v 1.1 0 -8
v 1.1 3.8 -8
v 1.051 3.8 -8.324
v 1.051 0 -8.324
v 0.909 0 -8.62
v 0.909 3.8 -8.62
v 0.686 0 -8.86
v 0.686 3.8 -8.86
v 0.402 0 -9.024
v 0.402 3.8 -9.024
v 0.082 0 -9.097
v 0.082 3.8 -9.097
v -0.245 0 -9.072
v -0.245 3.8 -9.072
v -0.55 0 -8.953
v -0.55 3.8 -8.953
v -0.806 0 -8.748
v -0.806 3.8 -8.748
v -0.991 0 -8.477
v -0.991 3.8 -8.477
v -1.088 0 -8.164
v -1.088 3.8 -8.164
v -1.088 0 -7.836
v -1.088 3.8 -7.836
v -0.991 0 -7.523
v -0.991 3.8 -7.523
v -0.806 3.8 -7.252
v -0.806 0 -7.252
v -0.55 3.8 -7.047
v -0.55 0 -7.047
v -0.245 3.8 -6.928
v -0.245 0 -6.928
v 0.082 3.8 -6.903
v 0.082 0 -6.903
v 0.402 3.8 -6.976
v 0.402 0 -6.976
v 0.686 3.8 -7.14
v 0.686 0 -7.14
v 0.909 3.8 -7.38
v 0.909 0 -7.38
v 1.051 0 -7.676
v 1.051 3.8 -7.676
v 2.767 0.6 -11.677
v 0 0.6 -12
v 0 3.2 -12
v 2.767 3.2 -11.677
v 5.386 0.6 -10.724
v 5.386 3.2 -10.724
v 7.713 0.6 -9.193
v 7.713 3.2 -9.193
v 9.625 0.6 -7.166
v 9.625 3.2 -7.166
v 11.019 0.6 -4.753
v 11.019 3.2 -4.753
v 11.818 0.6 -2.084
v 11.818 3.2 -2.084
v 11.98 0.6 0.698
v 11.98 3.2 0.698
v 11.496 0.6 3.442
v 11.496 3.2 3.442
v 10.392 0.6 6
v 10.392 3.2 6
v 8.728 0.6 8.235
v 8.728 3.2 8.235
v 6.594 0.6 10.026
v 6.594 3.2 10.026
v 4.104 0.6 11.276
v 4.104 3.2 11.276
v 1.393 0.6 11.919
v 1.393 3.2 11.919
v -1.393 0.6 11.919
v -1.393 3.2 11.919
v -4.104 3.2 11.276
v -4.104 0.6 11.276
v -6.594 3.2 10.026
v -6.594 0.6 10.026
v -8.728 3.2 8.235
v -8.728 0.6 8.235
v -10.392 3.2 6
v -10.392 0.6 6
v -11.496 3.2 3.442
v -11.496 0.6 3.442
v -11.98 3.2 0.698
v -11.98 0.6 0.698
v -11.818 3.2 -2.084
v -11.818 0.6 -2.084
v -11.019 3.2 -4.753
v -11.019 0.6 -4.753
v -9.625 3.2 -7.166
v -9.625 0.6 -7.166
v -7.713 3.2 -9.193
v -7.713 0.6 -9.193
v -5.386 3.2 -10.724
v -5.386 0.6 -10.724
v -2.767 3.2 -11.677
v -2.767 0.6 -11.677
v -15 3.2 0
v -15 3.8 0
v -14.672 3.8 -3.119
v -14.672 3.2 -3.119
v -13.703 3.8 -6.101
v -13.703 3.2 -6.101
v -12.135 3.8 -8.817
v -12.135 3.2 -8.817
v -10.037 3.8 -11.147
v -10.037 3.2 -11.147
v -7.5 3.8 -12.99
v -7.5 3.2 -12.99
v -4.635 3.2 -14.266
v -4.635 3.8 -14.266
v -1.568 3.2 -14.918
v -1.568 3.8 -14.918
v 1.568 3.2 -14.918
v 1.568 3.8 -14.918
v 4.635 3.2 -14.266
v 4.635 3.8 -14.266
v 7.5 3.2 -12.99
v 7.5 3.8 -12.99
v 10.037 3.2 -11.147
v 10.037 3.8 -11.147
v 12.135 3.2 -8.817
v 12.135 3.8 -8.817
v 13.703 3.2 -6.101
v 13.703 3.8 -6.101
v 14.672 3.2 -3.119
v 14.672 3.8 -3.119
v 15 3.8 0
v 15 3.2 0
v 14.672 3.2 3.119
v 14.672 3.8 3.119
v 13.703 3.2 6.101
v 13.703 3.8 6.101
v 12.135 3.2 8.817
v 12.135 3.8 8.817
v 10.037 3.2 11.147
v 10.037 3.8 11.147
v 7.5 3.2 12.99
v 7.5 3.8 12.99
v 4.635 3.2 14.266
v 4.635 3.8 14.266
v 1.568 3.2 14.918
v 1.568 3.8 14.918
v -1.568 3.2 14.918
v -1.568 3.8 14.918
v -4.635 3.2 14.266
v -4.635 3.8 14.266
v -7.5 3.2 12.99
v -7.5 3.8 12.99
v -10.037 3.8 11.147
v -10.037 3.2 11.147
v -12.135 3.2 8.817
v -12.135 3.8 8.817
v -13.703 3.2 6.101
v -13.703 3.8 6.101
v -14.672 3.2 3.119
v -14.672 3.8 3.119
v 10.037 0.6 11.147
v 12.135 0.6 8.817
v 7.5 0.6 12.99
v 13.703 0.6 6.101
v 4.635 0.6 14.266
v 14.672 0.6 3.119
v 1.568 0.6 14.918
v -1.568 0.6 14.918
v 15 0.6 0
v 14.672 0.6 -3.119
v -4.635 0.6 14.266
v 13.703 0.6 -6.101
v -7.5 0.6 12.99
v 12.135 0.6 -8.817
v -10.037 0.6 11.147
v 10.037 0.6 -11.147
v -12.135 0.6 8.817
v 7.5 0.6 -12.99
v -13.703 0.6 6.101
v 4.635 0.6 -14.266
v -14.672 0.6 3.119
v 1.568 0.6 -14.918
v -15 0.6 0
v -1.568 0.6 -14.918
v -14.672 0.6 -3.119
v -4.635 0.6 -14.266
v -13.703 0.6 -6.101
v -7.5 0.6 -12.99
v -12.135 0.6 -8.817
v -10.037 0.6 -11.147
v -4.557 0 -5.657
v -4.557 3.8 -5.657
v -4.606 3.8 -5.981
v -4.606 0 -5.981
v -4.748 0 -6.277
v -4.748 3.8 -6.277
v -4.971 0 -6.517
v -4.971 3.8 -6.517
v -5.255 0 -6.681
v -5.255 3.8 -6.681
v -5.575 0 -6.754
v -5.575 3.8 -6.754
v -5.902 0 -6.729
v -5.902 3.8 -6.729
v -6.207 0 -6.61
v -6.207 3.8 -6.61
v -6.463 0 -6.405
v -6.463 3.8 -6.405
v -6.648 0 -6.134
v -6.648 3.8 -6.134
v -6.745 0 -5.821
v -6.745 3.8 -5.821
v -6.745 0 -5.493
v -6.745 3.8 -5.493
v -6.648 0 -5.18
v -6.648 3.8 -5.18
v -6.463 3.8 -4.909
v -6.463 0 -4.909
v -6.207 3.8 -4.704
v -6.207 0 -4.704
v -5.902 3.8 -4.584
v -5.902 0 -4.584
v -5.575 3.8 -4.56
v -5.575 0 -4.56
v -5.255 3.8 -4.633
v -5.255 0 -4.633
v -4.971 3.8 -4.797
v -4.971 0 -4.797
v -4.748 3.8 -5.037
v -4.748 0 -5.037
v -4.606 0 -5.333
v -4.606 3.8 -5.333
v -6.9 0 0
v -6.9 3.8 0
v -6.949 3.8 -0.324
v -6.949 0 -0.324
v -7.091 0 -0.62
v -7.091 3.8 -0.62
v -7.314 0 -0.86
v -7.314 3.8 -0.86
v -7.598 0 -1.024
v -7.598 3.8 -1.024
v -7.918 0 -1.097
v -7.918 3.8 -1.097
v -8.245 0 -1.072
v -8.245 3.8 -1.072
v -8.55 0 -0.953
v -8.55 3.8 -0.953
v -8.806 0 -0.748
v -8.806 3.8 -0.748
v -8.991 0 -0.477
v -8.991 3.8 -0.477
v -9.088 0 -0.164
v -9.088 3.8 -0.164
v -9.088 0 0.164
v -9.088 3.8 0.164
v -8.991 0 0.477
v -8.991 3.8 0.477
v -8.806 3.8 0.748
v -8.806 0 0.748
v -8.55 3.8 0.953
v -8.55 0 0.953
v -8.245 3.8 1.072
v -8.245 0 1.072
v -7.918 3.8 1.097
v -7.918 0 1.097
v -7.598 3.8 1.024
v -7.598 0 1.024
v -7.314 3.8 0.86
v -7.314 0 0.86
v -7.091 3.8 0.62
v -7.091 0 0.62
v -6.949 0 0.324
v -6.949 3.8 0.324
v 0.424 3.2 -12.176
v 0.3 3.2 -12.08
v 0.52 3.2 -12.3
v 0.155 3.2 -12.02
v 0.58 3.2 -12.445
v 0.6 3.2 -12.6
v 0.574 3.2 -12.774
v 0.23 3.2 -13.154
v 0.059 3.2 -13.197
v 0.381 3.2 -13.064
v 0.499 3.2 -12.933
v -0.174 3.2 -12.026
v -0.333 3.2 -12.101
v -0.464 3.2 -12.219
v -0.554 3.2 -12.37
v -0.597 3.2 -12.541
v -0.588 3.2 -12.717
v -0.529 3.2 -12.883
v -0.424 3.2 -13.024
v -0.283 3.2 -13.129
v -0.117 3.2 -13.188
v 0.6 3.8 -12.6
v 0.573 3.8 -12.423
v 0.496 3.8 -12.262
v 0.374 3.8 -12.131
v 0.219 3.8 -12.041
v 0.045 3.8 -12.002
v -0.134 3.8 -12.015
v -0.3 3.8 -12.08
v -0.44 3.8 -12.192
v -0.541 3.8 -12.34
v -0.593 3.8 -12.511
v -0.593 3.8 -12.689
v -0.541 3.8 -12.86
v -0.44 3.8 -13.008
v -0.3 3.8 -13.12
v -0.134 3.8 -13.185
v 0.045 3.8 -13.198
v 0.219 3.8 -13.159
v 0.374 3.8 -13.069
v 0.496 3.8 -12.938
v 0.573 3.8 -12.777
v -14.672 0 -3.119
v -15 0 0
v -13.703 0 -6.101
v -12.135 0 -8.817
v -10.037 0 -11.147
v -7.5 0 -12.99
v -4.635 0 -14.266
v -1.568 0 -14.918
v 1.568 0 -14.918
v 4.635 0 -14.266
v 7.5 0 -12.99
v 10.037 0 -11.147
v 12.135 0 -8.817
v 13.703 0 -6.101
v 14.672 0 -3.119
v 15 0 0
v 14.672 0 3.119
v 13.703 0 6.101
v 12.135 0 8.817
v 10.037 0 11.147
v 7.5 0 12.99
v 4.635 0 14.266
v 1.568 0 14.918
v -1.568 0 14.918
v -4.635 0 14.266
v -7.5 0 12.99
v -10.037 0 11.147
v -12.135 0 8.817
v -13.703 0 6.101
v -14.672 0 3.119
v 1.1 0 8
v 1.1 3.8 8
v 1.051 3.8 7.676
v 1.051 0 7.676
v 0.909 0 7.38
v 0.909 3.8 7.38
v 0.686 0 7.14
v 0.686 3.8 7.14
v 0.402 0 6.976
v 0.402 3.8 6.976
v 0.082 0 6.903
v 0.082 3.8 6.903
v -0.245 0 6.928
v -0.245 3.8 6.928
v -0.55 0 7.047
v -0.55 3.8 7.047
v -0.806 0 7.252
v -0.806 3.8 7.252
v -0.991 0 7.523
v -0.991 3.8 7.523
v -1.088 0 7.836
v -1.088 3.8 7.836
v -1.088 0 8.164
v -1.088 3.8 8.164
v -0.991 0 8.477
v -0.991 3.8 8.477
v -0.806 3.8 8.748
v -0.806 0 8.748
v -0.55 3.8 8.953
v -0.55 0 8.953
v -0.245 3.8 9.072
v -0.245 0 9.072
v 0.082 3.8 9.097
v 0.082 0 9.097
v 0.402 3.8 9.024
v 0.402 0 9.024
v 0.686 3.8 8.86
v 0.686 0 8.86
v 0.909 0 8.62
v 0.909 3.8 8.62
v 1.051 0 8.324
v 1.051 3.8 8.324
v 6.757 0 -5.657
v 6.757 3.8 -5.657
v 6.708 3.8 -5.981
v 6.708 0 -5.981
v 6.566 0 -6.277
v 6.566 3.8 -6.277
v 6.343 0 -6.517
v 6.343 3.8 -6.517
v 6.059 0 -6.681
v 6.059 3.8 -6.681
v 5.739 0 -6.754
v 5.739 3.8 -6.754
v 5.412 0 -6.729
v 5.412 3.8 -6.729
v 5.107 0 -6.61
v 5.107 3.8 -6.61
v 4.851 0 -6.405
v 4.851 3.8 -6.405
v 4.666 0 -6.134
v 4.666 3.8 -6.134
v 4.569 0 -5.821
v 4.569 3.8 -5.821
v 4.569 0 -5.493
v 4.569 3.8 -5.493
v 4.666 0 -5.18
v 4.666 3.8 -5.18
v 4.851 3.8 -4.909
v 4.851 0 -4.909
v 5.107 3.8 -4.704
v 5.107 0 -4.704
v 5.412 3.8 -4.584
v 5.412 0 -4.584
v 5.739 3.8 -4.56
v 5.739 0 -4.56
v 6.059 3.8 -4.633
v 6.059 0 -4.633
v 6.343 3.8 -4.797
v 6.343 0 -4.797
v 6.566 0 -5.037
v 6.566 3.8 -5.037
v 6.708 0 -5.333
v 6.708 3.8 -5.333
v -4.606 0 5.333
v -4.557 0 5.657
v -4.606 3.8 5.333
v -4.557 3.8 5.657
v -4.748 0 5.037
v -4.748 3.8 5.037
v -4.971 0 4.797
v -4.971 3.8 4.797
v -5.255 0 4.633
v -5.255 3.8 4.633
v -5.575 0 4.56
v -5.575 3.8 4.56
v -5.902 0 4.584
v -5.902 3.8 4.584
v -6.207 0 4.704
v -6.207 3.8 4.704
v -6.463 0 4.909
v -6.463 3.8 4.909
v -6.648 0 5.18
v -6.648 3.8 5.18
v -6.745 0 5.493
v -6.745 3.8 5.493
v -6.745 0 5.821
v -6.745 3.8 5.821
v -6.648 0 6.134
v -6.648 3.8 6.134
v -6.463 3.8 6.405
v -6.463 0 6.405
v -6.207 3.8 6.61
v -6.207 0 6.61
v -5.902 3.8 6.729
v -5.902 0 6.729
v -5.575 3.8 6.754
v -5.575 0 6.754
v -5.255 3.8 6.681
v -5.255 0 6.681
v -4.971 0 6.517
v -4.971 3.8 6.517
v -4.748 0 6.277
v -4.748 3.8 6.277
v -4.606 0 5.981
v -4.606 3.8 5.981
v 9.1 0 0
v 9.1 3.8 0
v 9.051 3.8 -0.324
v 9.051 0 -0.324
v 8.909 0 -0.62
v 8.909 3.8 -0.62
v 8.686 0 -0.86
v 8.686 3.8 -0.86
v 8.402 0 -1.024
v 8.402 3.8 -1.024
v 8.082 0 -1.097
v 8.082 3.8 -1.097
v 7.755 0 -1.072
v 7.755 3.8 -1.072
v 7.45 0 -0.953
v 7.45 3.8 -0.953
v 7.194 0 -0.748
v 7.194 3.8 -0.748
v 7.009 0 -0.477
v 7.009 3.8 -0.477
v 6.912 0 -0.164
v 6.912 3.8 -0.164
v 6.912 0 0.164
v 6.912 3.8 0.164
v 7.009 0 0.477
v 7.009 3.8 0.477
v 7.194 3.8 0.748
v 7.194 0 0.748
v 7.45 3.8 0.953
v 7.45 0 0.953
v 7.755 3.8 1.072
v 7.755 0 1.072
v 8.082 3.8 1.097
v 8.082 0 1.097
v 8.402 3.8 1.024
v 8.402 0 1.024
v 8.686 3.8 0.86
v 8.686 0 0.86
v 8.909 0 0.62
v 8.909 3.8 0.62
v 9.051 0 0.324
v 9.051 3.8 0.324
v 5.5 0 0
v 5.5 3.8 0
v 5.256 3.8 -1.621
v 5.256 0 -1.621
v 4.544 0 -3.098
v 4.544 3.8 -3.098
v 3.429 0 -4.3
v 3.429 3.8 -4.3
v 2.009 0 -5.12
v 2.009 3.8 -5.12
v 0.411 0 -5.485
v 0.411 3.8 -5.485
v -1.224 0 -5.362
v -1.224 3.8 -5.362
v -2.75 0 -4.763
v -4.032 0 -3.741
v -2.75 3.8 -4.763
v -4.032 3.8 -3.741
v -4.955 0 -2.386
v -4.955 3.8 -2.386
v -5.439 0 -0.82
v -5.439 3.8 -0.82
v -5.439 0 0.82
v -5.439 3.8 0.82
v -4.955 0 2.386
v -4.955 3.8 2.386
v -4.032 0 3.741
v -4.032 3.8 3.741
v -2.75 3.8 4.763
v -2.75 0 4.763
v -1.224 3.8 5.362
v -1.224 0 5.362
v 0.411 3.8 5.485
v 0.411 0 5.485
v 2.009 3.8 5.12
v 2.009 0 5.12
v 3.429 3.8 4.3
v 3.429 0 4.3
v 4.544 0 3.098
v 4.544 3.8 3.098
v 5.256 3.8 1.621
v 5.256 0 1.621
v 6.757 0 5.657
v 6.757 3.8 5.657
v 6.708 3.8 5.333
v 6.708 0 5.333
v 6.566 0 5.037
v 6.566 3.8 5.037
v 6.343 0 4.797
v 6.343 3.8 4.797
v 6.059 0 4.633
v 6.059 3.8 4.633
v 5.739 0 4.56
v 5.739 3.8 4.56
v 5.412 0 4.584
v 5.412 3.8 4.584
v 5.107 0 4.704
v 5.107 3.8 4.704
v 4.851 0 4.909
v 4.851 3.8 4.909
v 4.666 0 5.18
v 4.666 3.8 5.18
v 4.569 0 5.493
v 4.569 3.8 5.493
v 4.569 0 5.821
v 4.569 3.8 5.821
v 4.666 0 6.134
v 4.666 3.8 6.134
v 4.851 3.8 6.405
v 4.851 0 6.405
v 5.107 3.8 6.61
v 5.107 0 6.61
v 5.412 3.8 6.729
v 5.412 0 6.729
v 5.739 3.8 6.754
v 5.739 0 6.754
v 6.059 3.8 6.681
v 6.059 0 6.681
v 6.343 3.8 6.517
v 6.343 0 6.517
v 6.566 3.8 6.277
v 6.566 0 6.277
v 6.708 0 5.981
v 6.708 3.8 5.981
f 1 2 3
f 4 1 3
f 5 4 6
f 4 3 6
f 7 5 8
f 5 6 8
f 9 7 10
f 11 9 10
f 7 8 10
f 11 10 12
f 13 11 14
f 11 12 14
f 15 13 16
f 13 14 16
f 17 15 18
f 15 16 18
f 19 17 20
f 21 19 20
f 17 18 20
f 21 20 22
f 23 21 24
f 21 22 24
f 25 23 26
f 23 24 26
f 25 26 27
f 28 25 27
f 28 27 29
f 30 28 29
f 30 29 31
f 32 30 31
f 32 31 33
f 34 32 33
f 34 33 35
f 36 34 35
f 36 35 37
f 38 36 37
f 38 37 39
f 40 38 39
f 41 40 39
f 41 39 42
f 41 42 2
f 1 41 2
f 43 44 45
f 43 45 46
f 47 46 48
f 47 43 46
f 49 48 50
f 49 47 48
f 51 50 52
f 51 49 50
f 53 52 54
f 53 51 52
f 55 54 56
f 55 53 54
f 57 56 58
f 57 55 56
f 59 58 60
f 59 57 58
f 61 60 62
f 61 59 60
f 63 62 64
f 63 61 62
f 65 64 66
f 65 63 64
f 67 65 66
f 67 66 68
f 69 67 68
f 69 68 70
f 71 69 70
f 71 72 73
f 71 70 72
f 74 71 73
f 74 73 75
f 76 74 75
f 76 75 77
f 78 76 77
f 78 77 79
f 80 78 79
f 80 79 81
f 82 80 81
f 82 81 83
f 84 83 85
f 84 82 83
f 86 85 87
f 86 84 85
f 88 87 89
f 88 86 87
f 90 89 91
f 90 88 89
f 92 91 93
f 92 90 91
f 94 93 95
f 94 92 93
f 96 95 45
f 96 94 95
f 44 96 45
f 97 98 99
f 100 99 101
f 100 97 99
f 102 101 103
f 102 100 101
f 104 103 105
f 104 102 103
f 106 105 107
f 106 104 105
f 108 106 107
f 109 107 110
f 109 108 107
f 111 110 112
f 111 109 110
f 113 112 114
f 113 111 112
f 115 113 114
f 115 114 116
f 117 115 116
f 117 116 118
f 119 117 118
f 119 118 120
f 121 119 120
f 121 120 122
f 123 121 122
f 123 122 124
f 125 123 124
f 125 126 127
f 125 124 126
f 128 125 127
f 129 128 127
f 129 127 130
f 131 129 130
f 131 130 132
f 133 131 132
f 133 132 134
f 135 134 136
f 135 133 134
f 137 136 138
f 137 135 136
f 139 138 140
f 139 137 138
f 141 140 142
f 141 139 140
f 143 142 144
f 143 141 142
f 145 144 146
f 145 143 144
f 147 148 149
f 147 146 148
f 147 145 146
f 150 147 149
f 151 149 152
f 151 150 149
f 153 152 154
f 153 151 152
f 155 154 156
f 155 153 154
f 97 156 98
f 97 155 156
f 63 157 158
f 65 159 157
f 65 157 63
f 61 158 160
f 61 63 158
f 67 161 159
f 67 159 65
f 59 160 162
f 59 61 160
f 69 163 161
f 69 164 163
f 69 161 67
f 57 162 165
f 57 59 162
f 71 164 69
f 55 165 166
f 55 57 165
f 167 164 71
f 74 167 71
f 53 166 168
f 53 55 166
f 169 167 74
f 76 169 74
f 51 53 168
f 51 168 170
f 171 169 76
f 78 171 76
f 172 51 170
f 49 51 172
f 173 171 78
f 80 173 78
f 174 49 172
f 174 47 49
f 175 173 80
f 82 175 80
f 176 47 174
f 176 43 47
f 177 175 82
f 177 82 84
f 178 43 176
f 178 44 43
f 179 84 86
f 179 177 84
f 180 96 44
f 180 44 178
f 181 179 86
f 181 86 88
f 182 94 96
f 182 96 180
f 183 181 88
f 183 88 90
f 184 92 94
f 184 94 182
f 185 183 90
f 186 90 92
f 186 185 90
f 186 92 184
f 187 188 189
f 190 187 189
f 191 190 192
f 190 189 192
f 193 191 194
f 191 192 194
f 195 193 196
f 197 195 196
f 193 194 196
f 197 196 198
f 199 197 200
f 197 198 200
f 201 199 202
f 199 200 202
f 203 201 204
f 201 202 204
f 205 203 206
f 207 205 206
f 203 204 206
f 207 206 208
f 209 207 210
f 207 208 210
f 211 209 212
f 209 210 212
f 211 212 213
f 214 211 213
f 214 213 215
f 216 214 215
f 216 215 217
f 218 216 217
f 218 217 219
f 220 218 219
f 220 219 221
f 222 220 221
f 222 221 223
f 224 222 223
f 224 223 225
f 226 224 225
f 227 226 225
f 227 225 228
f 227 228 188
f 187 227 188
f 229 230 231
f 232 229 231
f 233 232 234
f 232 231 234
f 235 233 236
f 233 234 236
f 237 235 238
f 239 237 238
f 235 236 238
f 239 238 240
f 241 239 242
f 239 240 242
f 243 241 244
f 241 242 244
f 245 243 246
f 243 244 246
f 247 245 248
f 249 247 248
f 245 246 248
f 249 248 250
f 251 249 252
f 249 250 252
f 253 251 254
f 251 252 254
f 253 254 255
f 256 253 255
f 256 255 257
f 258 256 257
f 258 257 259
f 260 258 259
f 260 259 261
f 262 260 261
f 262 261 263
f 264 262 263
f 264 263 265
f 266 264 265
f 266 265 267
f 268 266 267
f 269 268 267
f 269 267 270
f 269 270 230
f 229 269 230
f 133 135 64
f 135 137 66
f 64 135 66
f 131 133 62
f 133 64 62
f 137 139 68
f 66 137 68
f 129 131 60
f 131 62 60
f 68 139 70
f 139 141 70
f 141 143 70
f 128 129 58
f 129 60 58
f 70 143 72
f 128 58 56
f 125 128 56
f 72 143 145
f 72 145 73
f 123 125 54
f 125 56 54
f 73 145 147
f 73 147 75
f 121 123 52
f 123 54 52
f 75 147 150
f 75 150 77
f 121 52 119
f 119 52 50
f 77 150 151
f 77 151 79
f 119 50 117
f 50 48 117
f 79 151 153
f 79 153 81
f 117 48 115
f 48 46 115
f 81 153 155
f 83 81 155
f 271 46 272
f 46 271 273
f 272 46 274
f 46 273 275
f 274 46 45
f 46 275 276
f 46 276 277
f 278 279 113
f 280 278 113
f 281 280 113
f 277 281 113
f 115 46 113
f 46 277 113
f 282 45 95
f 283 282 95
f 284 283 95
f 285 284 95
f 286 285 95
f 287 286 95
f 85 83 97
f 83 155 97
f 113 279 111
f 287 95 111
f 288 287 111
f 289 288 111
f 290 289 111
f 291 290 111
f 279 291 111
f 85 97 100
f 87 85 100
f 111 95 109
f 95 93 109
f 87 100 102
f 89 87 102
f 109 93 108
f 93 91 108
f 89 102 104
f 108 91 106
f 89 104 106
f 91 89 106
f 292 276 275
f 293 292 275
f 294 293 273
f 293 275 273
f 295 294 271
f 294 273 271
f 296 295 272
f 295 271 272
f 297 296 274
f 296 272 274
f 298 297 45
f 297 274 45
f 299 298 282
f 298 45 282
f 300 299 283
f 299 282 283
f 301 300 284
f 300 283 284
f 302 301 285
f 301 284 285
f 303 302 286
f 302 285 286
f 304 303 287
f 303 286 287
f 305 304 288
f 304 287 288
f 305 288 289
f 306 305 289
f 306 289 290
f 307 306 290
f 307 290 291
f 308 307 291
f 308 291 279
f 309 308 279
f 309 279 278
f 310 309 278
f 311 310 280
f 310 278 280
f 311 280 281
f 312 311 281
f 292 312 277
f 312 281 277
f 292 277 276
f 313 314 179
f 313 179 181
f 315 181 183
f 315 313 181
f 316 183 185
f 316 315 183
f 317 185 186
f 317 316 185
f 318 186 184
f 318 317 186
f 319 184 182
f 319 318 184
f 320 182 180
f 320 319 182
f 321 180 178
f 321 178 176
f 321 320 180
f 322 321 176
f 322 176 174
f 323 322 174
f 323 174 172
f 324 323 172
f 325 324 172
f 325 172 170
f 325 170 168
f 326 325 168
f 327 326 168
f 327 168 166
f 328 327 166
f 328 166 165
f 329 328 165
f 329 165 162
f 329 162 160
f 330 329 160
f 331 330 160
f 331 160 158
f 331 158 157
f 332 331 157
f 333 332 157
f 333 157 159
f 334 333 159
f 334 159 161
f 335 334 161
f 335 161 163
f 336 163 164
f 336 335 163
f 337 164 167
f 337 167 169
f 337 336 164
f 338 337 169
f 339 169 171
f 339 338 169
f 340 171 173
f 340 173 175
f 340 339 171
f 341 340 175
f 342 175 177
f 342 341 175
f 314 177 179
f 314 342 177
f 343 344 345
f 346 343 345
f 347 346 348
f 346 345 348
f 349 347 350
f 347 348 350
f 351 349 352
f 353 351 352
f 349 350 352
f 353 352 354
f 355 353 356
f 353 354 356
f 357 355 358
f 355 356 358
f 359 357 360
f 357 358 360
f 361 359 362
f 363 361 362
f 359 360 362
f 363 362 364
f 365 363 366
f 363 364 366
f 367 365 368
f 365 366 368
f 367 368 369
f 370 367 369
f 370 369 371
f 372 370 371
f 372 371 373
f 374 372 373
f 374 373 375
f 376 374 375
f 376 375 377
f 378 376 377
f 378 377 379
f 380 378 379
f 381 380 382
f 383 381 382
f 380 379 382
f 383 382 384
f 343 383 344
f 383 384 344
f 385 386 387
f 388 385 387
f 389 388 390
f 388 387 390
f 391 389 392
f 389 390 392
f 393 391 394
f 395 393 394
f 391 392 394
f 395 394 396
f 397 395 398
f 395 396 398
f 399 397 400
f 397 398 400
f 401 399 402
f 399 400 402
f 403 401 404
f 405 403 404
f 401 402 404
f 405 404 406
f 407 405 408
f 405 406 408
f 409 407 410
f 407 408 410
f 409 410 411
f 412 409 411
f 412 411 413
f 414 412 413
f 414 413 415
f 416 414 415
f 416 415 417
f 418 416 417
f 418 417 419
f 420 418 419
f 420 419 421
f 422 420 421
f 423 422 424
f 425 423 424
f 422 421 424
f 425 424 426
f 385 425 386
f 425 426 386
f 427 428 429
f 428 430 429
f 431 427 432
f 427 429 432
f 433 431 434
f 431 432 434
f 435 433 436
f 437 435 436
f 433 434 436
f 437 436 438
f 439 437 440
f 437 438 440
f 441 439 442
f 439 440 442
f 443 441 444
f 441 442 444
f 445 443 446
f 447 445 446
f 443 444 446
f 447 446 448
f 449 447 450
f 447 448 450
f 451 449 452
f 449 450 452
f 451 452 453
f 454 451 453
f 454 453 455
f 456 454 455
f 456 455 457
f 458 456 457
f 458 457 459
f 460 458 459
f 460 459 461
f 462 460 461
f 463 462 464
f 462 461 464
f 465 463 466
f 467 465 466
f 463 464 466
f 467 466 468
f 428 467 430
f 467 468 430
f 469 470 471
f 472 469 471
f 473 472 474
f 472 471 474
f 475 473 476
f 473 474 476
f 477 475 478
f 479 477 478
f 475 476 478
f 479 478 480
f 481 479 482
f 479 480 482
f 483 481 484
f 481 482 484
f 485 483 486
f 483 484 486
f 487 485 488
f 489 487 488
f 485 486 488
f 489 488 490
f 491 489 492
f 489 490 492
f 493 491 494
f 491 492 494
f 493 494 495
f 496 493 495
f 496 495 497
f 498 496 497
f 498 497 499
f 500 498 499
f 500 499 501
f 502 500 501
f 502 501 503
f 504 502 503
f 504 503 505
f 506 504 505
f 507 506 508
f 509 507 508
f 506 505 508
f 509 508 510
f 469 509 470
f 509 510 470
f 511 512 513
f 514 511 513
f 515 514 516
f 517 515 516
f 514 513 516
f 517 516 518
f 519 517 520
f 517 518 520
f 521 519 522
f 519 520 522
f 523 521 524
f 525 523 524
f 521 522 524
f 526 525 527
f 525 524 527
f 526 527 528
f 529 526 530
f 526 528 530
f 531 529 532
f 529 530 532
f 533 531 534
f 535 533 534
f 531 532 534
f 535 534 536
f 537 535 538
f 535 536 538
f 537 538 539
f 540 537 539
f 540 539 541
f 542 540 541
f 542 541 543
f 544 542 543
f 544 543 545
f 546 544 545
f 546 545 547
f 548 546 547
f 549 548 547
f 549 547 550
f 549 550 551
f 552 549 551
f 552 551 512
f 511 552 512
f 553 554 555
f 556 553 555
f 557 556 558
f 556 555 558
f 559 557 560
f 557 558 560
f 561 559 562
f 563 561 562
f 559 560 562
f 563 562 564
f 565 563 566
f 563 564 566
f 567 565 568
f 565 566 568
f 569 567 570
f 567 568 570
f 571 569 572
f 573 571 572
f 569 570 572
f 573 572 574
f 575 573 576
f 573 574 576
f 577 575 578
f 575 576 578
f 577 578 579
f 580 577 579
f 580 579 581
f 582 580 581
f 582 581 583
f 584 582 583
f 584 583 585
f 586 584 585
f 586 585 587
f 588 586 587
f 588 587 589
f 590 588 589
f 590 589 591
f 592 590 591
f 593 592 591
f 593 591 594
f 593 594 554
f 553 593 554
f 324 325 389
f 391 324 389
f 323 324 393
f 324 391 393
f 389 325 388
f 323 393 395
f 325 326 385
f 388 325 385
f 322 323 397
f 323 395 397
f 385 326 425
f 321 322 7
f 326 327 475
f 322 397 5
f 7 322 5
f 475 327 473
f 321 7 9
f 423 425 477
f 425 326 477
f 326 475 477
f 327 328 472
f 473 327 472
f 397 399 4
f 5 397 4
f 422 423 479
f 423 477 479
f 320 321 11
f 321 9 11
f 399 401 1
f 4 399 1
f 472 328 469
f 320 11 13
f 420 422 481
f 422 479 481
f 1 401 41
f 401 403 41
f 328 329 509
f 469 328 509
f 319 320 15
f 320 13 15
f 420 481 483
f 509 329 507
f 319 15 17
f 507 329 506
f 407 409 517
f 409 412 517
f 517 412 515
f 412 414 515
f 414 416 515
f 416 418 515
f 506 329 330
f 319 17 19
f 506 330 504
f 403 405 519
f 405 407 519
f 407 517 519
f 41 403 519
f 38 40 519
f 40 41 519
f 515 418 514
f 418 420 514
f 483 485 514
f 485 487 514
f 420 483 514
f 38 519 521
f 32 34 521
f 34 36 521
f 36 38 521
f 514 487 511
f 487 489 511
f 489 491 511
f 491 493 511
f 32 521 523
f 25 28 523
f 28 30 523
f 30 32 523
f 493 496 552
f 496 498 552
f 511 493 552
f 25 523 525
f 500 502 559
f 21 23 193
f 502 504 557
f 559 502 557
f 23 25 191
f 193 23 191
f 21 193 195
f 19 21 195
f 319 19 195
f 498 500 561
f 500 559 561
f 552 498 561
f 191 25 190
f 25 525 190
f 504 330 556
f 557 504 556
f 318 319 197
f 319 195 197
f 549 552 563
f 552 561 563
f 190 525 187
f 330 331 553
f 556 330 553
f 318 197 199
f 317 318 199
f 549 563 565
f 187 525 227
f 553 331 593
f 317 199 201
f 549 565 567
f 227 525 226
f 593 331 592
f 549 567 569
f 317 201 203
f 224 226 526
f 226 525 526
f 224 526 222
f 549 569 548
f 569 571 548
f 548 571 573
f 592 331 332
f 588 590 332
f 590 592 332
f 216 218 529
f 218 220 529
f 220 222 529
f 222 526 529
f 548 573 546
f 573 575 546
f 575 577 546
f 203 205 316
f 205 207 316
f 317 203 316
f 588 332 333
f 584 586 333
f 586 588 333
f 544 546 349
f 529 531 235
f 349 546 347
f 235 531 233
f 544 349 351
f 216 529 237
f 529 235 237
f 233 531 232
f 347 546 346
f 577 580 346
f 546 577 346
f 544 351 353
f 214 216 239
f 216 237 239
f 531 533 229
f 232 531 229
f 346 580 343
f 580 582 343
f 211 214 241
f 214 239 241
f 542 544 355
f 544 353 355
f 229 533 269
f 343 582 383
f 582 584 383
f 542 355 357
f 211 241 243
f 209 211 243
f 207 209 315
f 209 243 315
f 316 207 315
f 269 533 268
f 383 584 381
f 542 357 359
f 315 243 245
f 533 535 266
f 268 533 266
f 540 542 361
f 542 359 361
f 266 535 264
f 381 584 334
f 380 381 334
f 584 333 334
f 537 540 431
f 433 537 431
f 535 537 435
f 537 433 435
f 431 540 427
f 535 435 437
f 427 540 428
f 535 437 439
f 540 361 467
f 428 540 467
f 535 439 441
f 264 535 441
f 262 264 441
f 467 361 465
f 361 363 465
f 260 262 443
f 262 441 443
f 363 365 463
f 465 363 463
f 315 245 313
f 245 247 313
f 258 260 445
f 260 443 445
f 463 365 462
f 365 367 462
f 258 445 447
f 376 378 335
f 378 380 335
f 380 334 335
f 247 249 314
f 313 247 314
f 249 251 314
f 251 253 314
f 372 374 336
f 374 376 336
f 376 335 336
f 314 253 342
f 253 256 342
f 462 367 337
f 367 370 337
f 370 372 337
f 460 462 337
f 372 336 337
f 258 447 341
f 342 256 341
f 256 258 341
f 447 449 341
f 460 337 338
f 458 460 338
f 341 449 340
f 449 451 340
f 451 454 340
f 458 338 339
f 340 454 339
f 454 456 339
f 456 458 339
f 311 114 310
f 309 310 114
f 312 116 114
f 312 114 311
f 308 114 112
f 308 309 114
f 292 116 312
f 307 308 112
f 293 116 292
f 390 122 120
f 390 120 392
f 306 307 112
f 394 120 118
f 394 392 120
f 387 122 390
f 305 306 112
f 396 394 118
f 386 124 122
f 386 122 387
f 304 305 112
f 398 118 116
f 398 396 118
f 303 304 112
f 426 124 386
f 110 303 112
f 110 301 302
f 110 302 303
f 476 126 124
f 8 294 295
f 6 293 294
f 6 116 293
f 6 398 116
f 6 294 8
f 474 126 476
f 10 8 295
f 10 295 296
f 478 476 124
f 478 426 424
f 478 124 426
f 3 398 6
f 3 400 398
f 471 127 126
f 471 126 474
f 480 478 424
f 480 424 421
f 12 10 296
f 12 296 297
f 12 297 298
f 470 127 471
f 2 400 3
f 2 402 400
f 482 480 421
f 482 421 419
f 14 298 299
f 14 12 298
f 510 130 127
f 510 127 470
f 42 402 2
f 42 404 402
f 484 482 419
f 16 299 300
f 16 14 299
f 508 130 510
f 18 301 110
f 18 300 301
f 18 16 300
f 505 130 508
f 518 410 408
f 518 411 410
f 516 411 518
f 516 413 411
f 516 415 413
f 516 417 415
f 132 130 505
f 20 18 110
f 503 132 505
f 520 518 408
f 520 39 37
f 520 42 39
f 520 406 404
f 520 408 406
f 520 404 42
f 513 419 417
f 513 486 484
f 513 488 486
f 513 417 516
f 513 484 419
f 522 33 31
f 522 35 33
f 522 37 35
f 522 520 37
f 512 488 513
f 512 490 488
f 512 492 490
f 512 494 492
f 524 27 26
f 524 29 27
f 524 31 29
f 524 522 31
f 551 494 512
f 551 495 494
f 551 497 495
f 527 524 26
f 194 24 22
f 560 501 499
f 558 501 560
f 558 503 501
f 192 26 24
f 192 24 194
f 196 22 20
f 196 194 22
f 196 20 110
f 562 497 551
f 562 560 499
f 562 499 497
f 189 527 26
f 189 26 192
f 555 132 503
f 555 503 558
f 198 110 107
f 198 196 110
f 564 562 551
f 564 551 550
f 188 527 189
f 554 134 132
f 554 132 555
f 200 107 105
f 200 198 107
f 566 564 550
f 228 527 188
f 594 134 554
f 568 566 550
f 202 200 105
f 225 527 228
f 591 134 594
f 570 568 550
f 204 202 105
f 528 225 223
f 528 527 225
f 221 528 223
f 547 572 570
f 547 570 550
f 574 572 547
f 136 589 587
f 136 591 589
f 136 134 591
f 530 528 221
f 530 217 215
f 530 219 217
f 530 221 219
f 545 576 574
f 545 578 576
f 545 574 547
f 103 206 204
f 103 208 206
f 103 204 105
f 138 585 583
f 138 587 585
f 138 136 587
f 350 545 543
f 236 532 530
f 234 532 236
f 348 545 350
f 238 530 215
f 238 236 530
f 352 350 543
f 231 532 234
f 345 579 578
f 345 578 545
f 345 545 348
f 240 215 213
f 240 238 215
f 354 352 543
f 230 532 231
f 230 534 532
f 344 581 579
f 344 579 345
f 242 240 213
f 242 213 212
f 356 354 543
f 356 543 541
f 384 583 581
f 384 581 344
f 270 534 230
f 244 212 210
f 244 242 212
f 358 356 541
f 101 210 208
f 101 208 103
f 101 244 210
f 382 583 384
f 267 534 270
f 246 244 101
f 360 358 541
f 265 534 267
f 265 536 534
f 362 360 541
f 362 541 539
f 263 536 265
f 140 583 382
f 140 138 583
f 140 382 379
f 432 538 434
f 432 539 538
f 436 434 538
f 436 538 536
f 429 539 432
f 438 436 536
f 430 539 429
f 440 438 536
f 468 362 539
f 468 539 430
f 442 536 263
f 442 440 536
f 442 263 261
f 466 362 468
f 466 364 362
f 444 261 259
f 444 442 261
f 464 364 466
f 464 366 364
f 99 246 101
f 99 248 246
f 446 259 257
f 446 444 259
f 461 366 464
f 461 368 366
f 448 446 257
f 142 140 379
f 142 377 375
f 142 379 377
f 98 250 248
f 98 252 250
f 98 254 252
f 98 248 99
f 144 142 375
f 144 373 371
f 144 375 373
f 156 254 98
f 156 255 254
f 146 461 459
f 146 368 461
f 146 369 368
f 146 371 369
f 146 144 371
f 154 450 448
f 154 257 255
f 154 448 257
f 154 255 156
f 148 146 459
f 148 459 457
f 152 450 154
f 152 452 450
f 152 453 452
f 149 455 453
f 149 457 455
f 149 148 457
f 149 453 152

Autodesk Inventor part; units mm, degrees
ref_plane "YZ Plane" through (0, 0, 0) normal (1, 0, 0) x (0, 1, 0)
ref_plane "XZ Plane" through (0, 0, 0) normal (0, 1, 0) x (-1, 0, 0)
ref_plane "XY Plane" through (0, 0, 0) normal (0, 0, 1) x (1, 0, 0)
sketch "Sketch1" plane through (0, 0, 0) normal (0, 1, 0) x (-1, 0, 0)
  circle A0 centre (0, 0) radius 15
  dimension "d0" = 30
extrude "Extrusion1" add sketch "Sketch1" along normal blind 3.8
sketch "Sketch2" plane through (0, 3.8, 0) normal (0, 1, 0) x (1, 0, 0)
  circle A0 centre (0, 0) radius 8 construction
  circle A1 centre (-8, 0) radius 1.1
  circle A2 centre (-5.6569, -5.6569) radius 1.1
  circle A3 centre (0, -8) radius 1.1
  circle A4 centre (5.6569, -5.6569) radius 1.1
  circle A5 centre (8, 0) radius 1.1
  circle A6 centre (5.6569, 5.6569) radius 1.1
  circle A7 centre (0, 8) radius 1.1
  circle A8 centre (-5.6569, 5.6569) radius 1.1
  circle A9 centre (0, 0) radius 5.5
  dimension "d3" = 16
  dimension "d4" = 2.2
  dimension "d7" = 360
  dimension "d9" = 11
extrude "Extrusion2" cut sketch "Sketch2" against normal through all
sketch "Sketch3" plane through (0, 0, 0) normal (1, 0, 0) x (0, 1, 0)
  point P0 (0, 0)
sketch "Sketch4" plane through (0, 0, 0) normal (1, 0, 0) x (0, 1, 0)
  line L0 (3.8, 5.5) -> (0, 5.5) construction
  line L1 (0, 5.5) -> (0, 6.9) construction
  line L2 (0, 6.9) -> (3.8, 6.9) construction
  line L3 (3.8, 6.9) -> (3.8, 5.5) construction
  line L4 (0, -5.5) -> (3.8, -5.5) construction
  line L5 (3.8, -5.5) -> (3.8, -6.9) construction
  line L6 (3.8, -6.9) -> (0, -6.9) construction
  line L7 (0, -6.9) -> (0, -5.5) construction
  line L8 (0, 15) -> (3.8, 15) construction
  line L9 (3.8, 15) -> (3.8, 9.1) construction
  line L10 (3.8, 9.1) -> (0, 9.1) construction
  line L11 (0, 9.1) -> (0, 15) construction
  line L12 (3.8, -15) -> (0, -15) construction
  line L13 (0, -15) -> (0, -9.1) construction
  line L14 (0, -9.1) -> (3.8, -9.1) construction
  line L15 (3.8, -9.1) -> (3.8, -15) construction
  line L16 (0.6, -15) -> (3.2, -15)
  line L17 (3.2, -15) -> (3.2, -12)
  line L18 (3.2, -12) -> (0.6, -12)
  line L19 (0.6, -12) -> (0.6, -15)
  line L20 (-0.76, 0) -> (4.56, 0) projected
  point P0 (0, 0)
  point P1 (1.9, -15)
  dimension "d12" = 0.6
  dimension "d15" = 12
revolve "Revolution1" cut sketch "Sketch4" angle 360 about axis through (0, -10, 0) along (0, 1, 0)
sketch "Sketch5" plane through (0, 3.2, 0) normal (0, -1, 0) x (1, 0, 0)
  circle A0 centre (0, -12.6) radius 0.6
  circle A1 centre (0, 0) radius 12 construction
  circle A2 centre (0, 0) radius 15 construction
  circle A3 centre (-8, 0) radius 1.1 construction
  circle A4 centre (8, 0) radius 1.1 construction
  circle A5 centre (5.6569, 5.6569) radius 1.1 construction
  circle A6 centre (-5.6569, -5.6569) radius 1.1 construction
  circle A7 centre (-5.6569, 5.6569) radius 1.1 construction
  circle A8 centre (5.6569, -5.6569) radius 1.1 construction
  circle A9 centre (0, 8) radius 1.1 construction
  circle A10 centre (0, -8) radius 1.1 construction
  circle A11 centre (0, 0) radius 5.5 construction
  dimension "d17" = 1.2
extrude "Extrusion3" cut sketch "Sketch5" against normal up to surface (0.6 mm away)
properties part number "Pully_r12"
